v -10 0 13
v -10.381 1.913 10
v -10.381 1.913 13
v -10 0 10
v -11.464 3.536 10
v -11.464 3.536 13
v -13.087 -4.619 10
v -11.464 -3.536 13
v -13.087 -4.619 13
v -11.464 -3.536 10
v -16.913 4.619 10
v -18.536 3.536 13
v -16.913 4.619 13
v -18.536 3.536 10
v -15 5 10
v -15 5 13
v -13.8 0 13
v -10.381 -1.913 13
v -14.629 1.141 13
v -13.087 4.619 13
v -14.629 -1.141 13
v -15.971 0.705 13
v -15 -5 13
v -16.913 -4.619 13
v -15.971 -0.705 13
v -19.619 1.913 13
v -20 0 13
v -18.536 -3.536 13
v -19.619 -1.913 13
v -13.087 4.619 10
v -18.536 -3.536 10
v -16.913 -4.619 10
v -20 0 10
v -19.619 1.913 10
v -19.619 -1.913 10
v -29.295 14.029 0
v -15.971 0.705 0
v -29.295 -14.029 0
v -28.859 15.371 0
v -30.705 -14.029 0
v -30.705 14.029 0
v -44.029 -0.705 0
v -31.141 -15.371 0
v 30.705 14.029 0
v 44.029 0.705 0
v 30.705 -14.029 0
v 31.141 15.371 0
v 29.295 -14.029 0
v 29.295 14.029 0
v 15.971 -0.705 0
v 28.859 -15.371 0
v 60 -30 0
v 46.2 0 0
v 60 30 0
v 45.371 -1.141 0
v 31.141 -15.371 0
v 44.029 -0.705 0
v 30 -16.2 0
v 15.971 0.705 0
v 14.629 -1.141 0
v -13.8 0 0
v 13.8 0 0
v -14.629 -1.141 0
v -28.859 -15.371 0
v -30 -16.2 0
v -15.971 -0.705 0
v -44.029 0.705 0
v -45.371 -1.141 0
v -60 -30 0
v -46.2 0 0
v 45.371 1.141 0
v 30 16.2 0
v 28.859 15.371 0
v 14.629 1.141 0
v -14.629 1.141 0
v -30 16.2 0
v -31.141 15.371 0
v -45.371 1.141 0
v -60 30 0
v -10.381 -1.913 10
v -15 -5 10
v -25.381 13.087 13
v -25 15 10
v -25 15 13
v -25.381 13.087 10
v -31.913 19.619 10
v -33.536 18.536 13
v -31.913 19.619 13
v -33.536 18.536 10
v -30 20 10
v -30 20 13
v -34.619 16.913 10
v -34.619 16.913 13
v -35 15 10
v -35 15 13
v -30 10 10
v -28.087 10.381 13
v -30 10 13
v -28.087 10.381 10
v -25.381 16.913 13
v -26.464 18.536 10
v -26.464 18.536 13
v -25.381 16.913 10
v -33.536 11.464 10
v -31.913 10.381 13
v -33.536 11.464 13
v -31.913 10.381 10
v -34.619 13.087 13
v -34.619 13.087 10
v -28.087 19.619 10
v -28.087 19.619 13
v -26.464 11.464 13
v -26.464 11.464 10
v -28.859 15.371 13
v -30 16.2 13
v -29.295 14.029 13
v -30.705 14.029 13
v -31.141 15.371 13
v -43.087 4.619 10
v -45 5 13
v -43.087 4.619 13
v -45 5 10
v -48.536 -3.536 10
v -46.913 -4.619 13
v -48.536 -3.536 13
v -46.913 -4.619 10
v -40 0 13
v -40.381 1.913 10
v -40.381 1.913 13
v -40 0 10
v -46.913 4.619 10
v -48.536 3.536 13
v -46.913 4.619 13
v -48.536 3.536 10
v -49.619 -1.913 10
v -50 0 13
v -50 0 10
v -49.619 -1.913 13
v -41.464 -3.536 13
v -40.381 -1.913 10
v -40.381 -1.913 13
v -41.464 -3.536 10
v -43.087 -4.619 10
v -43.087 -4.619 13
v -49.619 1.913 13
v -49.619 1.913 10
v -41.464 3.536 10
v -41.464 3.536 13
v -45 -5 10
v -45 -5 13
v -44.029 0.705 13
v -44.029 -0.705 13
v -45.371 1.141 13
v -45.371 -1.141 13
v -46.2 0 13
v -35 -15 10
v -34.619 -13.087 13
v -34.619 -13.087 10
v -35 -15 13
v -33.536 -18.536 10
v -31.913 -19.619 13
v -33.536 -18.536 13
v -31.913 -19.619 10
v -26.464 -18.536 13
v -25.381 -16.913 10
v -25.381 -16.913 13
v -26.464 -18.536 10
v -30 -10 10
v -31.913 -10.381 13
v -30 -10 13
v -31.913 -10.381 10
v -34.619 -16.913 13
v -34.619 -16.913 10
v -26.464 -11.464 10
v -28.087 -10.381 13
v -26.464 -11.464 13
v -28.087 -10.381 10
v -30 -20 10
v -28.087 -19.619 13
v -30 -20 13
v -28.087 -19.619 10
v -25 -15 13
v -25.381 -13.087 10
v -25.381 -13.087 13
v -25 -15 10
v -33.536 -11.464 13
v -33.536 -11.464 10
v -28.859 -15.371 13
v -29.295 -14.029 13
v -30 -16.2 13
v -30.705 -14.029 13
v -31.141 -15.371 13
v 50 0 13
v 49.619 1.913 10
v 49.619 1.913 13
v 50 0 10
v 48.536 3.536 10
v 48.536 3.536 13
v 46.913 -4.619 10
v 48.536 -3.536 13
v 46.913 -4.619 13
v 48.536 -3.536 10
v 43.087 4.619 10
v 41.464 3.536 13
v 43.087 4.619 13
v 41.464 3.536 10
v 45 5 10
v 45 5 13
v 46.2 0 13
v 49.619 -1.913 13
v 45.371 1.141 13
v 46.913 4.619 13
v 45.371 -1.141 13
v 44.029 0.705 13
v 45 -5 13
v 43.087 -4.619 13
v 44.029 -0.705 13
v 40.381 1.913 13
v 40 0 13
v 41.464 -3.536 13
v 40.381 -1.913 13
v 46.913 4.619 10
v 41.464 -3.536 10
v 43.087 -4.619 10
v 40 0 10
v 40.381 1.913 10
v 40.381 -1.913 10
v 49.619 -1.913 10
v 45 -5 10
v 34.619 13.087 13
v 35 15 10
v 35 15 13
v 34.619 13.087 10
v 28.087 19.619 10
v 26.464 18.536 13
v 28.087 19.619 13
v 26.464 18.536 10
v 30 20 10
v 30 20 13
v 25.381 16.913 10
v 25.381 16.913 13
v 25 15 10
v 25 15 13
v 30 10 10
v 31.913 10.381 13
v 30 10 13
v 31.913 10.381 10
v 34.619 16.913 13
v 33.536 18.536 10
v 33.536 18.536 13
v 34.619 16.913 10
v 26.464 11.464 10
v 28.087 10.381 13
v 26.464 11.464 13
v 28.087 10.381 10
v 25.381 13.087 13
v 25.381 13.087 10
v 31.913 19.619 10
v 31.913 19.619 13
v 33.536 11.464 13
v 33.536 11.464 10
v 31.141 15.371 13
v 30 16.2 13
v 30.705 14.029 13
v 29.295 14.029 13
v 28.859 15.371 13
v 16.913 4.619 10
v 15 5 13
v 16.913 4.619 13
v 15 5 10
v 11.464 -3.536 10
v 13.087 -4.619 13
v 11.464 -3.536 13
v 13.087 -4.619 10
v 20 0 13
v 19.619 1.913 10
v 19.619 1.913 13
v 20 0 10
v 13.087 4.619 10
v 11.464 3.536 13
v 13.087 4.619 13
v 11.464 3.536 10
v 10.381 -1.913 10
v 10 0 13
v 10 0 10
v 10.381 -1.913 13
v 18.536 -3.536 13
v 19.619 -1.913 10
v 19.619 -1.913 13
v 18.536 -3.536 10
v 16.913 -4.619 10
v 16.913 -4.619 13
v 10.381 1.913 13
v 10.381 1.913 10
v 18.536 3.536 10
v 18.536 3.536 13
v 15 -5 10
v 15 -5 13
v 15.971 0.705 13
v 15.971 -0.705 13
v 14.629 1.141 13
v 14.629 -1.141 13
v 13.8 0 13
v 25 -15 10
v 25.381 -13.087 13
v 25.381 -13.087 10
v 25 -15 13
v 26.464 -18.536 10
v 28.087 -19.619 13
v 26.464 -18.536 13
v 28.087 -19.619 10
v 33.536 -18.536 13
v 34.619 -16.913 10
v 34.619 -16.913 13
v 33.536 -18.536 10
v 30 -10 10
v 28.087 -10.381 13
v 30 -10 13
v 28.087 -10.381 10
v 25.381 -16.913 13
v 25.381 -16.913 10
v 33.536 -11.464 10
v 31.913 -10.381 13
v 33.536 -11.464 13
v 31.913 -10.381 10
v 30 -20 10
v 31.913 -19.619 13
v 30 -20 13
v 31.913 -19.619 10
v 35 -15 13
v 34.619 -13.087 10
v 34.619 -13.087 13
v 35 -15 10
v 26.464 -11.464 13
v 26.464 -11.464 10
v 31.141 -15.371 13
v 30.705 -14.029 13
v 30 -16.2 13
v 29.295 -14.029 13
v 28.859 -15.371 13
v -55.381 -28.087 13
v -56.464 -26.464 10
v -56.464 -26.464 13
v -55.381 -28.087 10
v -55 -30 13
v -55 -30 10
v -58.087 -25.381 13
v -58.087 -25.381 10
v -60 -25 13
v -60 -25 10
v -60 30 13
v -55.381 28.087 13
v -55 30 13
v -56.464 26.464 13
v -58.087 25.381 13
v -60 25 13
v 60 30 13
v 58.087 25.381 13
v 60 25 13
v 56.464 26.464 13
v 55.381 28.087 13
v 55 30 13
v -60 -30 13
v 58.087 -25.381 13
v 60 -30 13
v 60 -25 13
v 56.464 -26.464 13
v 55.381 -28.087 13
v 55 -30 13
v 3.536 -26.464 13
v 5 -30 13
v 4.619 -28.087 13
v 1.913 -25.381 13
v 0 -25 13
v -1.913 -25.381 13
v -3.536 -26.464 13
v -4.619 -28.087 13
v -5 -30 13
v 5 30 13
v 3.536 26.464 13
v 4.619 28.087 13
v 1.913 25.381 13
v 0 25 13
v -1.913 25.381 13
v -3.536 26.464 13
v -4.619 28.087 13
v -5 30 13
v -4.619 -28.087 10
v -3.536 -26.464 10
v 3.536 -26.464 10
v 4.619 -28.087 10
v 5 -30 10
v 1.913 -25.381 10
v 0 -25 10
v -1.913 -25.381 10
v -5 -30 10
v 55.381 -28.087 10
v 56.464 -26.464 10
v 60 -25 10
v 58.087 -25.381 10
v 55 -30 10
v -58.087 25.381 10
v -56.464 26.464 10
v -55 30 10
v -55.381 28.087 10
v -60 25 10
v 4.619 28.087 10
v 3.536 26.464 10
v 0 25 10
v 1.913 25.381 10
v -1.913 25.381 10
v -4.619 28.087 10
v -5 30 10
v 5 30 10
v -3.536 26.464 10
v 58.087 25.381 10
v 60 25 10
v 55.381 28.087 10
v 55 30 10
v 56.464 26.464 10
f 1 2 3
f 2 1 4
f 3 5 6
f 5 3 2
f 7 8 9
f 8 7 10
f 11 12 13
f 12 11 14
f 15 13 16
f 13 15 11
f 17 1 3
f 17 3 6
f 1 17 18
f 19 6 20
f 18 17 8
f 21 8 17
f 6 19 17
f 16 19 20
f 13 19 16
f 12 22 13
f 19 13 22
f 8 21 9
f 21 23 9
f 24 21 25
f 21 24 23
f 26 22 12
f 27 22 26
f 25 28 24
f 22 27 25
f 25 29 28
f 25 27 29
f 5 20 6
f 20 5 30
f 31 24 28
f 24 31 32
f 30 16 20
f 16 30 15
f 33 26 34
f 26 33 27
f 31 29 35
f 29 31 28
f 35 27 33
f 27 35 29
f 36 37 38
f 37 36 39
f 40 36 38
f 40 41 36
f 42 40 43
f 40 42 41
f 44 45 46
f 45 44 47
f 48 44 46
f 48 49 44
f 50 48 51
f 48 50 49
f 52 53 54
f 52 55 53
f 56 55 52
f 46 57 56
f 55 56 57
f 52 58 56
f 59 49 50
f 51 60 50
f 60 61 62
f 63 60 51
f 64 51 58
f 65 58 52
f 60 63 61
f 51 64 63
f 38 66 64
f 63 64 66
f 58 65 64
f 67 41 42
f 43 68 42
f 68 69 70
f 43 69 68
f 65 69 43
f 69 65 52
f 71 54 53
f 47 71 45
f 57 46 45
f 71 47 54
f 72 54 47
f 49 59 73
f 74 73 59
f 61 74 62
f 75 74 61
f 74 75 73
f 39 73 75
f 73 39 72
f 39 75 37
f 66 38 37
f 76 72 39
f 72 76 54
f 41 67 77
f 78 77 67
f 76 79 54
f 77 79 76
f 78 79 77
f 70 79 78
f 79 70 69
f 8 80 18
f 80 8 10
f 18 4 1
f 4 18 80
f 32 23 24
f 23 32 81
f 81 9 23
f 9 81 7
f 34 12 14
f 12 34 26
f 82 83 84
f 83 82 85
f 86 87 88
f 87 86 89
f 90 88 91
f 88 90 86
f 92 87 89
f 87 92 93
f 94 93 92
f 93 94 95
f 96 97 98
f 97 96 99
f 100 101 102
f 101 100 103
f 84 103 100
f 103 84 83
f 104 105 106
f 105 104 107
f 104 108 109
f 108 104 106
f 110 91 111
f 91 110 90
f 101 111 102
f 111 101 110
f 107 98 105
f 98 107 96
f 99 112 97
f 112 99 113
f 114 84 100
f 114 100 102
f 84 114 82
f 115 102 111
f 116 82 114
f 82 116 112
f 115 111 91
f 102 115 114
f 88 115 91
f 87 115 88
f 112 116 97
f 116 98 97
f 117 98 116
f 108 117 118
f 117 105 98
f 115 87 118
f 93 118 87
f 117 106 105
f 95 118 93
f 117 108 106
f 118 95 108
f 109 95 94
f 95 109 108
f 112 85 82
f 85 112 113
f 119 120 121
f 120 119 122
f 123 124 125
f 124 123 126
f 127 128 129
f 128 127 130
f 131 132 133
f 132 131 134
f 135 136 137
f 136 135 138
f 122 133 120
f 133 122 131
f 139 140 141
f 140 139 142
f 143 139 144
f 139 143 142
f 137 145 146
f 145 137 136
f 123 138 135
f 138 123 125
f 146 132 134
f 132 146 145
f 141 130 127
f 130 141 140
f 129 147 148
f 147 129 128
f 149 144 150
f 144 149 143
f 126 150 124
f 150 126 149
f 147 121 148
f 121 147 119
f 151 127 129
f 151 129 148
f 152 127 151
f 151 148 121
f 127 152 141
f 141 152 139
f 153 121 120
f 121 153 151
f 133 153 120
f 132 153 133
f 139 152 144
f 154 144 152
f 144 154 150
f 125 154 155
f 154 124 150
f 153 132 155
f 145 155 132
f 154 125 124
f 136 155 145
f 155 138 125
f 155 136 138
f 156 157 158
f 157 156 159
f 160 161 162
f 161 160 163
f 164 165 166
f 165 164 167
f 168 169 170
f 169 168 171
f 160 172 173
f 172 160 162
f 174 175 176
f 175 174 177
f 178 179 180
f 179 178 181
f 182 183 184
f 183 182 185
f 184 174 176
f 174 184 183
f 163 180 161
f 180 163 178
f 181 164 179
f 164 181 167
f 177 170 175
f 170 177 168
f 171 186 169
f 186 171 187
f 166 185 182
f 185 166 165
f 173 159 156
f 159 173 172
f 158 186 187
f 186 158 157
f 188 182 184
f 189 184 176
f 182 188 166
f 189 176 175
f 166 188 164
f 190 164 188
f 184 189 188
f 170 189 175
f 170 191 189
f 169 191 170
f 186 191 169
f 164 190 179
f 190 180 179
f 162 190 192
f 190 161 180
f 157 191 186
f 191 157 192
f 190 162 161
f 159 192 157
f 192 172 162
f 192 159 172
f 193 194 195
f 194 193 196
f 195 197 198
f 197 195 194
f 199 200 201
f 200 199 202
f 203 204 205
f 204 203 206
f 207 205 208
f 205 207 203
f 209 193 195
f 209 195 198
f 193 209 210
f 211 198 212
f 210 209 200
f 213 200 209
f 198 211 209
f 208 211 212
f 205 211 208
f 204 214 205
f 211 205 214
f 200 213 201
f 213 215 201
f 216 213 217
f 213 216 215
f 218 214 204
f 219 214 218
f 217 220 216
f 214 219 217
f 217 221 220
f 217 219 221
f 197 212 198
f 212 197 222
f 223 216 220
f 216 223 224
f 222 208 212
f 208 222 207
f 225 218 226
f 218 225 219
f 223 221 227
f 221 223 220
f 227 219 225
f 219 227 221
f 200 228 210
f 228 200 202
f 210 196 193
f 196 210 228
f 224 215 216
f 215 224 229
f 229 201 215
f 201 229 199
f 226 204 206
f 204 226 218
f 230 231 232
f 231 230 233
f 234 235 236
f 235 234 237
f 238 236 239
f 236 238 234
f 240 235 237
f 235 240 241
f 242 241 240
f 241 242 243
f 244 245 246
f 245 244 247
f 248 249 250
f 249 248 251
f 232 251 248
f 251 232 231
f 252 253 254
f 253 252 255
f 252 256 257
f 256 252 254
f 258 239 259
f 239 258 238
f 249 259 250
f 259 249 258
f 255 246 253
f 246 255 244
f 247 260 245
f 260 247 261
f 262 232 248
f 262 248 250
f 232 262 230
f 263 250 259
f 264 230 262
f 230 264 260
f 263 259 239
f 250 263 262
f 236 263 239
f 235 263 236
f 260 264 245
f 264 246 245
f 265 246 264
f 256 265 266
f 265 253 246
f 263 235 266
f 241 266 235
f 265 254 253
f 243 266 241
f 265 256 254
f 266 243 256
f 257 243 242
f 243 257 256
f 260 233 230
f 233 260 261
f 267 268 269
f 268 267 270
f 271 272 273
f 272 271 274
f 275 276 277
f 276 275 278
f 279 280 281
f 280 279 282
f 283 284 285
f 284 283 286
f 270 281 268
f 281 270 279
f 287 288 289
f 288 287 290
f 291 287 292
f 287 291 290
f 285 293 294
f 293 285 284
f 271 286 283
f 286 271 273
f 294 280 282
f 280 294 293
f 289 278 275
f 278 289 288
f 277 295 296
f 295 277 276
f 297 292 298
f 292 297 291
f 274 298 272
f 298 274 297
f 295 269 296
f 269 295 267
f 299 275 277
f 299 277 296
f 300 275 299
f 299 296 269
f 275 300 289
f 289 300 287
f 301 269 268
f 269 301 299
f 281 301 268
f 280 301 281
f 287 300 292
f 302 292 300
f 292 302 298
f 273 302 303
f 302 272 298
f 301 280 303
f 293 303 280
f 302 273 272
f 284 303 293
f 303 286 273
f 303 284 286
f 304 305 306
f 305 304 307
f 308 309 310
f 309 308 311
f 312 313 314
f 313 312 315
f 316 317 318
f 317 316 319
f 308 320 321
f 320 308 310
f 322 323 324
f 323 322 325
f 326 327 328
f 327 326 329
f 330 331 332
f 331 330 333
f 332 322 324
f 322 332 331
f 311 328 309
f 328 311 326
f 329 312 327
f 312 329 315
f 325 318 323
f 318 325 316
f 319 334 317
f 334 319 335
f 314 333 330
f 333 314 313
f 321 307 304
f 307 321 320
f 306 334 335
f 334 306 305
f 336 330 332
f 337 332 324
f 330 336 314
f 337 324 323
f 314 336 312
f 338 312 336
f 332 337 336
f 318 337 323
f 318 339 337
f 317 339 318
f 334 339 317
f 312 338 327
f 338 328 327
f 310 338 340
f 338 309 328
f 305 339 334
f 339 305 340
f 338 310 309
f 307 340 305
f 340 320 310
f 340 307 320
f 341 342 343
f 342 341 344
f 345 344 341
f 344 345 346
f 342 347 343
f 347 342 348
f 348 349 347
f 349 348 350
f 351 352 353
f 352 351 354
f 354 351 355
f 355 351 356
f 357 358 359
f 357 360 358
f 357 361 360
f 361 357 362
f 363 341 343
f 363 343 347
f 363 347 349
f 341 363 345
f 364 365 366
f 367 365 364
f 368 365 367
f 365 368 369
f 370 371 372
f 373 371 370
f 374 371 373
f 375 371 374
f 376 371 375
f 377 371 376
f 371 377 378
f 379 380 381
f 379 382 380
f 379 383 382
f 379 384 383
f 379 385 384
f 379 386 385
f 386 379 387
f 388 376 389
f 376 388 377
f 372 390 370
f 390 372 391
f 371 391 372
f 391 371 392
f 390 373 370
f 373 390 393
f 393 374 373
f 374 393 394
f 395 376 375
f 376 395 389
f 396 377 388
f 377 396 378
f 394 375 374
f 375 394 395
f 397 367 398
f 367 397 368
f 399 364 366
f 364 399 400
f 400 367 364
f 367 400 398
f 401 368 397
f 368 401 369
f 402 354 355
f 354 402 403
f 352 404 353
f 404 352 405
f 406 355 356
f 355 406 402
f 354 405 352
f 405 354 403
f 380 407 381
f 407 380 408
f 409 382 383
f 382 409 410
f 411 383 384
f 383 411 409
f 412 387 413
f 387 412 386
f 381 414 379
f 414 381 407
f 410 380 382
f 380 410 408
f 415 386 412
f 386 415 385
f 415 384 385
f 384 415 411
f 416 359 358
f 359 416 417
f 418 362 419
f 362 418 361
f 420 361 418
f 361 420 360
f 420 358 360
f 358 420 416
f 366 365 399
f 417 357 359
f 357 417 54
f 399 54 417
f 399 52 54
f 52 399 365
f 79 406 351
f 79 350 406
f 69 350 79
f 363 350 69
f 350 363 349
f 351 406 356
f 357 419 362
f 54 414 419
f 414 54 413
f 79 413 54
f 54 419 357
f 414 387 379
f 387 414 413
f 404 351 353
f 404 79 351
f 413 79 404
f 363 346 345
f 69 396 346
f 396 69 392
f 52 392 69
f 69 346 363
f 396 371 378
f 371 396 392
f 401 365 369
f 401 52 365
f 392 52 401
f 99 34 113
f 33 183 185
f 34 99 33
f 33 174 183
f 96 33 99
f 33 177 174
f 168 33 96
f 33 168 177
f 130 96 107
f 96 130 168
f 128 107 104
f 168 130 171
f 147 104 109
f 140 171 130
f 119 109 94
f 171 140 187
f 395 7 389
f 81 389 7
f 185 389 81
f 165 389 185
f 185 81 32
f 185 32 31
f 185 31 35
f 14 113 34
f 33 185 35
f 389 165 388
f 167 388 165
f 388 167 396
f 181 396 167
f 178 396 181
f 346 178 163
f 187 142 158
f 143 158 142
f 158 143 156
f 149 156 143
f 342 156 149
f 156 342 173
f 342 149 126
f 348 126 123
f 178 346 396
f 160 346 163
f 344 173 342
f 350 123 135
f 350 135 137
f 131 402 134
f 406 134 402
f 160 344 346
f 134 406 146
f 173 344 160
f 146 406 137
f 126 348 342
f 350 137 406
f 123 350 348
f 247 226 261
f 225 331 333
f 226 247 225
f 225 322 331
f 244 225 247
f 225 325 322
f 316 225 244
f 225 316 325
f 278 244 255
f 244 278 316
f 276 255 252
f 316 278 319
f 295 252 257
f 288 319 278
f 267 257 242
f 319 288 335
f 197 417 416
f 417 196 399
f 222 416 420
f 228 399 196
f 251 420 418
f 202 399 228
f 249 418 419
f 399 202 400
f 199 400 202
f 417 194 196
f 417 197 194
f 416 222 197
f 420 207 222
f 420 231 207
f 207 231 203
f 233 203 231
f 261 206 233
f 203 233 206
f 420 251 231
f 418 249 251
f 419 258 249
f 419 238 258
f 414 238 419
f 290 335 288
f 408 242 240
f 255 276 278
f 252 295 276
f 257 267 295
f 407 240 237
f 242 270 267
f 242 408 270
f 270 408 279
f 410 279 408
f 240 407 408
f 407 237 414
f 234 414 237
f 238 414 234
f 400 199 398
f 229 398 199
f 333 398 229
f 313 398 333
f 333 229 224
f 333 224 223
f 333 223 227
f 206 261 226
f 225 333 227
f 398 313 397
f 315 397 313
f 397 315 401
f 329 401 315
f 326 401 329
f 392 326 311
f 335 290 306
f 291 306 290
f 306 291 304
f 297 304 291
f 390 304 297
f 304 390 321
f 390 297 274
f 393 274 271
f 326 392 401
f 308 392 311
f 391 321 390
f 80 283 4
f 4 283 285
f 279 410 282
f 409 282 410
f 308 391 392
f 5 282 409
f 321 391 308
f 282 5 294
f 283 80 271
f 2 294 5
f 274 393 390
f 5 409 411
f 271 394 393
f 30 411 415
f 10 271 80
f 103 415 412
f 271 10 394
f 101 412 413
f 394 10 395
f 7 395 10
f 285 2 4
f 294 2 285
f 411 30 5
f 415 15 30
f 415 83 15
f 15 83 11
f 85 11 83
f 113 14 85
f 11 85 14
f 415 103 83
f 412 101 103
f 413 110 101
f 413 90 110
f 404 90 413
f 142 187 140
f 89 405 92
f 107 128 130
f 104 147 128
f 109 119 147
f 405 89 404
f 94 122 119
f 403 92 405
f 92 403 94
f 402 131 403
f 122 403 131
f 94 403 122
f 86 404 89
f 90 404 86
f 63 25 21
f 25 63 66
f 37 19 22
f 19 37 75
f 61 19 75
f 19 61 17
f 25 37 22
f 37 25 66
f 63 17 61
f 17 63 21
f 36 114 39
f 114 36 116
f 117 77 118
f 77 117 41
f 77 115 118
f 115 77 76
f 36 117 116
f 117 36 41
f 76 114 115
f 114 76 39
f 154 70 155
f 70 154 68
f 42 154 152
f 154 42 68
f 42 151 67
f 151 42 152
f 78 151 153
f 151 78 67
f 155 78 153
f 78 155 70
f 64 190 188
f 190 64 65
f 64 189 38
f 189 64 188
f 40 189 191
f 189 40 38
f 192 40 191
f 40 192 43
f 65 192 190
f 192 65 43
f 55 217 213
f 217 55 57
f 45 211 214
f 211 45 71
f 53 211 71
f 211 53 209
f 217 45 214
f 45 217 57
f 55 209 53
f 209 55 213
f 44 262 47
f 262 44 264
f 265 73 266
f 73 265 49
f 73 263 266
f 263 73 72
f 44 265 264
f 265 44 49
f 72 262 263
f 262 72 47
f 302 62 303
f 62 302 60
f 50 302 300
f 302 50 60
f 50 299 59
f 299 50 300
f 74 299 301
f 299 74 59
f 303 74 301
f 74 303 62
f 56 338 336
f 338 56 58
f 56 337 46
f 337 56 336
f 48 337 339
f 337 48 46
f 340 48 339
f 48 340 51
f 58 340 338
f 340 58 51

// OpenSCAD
$e = 0.01;
base_h = 10;
boss_h = 3;
boss_d = 10;
boss_x = 15;
screw_d = 2.4;
corner_r = 5;

module bosses(r, h) {
  for (x = [-30, 30])
    translate([x, 0, 0])
      for (a = [0, 90, 180, 270])
        rotate([0, 0, a])
          translate([boss_x, 0, 0])
            cylinder(r = r, h = h);
}

difference() {
  union() {
    translate([-60, -30, 0]) cube([120, 60, base_h]);
    bosses(r = boss_d/2, h = base_h + boss_h);
    intersection() {
      translate([-60, -30, 0]) cube([120, 60, base_h + boss_h]);
      union() {
        for (y = [-30, 30])
          for (x = [-60, 0, 60])
            translate([x, y, 0])
              cylinder(r = corner_r, h = base_h + boss_h);
      }
    }
  }
  translate([0, 0, -$e]) bosses(r = screw_d / 2, h = base_h + boss_h + 2*$e);
}
